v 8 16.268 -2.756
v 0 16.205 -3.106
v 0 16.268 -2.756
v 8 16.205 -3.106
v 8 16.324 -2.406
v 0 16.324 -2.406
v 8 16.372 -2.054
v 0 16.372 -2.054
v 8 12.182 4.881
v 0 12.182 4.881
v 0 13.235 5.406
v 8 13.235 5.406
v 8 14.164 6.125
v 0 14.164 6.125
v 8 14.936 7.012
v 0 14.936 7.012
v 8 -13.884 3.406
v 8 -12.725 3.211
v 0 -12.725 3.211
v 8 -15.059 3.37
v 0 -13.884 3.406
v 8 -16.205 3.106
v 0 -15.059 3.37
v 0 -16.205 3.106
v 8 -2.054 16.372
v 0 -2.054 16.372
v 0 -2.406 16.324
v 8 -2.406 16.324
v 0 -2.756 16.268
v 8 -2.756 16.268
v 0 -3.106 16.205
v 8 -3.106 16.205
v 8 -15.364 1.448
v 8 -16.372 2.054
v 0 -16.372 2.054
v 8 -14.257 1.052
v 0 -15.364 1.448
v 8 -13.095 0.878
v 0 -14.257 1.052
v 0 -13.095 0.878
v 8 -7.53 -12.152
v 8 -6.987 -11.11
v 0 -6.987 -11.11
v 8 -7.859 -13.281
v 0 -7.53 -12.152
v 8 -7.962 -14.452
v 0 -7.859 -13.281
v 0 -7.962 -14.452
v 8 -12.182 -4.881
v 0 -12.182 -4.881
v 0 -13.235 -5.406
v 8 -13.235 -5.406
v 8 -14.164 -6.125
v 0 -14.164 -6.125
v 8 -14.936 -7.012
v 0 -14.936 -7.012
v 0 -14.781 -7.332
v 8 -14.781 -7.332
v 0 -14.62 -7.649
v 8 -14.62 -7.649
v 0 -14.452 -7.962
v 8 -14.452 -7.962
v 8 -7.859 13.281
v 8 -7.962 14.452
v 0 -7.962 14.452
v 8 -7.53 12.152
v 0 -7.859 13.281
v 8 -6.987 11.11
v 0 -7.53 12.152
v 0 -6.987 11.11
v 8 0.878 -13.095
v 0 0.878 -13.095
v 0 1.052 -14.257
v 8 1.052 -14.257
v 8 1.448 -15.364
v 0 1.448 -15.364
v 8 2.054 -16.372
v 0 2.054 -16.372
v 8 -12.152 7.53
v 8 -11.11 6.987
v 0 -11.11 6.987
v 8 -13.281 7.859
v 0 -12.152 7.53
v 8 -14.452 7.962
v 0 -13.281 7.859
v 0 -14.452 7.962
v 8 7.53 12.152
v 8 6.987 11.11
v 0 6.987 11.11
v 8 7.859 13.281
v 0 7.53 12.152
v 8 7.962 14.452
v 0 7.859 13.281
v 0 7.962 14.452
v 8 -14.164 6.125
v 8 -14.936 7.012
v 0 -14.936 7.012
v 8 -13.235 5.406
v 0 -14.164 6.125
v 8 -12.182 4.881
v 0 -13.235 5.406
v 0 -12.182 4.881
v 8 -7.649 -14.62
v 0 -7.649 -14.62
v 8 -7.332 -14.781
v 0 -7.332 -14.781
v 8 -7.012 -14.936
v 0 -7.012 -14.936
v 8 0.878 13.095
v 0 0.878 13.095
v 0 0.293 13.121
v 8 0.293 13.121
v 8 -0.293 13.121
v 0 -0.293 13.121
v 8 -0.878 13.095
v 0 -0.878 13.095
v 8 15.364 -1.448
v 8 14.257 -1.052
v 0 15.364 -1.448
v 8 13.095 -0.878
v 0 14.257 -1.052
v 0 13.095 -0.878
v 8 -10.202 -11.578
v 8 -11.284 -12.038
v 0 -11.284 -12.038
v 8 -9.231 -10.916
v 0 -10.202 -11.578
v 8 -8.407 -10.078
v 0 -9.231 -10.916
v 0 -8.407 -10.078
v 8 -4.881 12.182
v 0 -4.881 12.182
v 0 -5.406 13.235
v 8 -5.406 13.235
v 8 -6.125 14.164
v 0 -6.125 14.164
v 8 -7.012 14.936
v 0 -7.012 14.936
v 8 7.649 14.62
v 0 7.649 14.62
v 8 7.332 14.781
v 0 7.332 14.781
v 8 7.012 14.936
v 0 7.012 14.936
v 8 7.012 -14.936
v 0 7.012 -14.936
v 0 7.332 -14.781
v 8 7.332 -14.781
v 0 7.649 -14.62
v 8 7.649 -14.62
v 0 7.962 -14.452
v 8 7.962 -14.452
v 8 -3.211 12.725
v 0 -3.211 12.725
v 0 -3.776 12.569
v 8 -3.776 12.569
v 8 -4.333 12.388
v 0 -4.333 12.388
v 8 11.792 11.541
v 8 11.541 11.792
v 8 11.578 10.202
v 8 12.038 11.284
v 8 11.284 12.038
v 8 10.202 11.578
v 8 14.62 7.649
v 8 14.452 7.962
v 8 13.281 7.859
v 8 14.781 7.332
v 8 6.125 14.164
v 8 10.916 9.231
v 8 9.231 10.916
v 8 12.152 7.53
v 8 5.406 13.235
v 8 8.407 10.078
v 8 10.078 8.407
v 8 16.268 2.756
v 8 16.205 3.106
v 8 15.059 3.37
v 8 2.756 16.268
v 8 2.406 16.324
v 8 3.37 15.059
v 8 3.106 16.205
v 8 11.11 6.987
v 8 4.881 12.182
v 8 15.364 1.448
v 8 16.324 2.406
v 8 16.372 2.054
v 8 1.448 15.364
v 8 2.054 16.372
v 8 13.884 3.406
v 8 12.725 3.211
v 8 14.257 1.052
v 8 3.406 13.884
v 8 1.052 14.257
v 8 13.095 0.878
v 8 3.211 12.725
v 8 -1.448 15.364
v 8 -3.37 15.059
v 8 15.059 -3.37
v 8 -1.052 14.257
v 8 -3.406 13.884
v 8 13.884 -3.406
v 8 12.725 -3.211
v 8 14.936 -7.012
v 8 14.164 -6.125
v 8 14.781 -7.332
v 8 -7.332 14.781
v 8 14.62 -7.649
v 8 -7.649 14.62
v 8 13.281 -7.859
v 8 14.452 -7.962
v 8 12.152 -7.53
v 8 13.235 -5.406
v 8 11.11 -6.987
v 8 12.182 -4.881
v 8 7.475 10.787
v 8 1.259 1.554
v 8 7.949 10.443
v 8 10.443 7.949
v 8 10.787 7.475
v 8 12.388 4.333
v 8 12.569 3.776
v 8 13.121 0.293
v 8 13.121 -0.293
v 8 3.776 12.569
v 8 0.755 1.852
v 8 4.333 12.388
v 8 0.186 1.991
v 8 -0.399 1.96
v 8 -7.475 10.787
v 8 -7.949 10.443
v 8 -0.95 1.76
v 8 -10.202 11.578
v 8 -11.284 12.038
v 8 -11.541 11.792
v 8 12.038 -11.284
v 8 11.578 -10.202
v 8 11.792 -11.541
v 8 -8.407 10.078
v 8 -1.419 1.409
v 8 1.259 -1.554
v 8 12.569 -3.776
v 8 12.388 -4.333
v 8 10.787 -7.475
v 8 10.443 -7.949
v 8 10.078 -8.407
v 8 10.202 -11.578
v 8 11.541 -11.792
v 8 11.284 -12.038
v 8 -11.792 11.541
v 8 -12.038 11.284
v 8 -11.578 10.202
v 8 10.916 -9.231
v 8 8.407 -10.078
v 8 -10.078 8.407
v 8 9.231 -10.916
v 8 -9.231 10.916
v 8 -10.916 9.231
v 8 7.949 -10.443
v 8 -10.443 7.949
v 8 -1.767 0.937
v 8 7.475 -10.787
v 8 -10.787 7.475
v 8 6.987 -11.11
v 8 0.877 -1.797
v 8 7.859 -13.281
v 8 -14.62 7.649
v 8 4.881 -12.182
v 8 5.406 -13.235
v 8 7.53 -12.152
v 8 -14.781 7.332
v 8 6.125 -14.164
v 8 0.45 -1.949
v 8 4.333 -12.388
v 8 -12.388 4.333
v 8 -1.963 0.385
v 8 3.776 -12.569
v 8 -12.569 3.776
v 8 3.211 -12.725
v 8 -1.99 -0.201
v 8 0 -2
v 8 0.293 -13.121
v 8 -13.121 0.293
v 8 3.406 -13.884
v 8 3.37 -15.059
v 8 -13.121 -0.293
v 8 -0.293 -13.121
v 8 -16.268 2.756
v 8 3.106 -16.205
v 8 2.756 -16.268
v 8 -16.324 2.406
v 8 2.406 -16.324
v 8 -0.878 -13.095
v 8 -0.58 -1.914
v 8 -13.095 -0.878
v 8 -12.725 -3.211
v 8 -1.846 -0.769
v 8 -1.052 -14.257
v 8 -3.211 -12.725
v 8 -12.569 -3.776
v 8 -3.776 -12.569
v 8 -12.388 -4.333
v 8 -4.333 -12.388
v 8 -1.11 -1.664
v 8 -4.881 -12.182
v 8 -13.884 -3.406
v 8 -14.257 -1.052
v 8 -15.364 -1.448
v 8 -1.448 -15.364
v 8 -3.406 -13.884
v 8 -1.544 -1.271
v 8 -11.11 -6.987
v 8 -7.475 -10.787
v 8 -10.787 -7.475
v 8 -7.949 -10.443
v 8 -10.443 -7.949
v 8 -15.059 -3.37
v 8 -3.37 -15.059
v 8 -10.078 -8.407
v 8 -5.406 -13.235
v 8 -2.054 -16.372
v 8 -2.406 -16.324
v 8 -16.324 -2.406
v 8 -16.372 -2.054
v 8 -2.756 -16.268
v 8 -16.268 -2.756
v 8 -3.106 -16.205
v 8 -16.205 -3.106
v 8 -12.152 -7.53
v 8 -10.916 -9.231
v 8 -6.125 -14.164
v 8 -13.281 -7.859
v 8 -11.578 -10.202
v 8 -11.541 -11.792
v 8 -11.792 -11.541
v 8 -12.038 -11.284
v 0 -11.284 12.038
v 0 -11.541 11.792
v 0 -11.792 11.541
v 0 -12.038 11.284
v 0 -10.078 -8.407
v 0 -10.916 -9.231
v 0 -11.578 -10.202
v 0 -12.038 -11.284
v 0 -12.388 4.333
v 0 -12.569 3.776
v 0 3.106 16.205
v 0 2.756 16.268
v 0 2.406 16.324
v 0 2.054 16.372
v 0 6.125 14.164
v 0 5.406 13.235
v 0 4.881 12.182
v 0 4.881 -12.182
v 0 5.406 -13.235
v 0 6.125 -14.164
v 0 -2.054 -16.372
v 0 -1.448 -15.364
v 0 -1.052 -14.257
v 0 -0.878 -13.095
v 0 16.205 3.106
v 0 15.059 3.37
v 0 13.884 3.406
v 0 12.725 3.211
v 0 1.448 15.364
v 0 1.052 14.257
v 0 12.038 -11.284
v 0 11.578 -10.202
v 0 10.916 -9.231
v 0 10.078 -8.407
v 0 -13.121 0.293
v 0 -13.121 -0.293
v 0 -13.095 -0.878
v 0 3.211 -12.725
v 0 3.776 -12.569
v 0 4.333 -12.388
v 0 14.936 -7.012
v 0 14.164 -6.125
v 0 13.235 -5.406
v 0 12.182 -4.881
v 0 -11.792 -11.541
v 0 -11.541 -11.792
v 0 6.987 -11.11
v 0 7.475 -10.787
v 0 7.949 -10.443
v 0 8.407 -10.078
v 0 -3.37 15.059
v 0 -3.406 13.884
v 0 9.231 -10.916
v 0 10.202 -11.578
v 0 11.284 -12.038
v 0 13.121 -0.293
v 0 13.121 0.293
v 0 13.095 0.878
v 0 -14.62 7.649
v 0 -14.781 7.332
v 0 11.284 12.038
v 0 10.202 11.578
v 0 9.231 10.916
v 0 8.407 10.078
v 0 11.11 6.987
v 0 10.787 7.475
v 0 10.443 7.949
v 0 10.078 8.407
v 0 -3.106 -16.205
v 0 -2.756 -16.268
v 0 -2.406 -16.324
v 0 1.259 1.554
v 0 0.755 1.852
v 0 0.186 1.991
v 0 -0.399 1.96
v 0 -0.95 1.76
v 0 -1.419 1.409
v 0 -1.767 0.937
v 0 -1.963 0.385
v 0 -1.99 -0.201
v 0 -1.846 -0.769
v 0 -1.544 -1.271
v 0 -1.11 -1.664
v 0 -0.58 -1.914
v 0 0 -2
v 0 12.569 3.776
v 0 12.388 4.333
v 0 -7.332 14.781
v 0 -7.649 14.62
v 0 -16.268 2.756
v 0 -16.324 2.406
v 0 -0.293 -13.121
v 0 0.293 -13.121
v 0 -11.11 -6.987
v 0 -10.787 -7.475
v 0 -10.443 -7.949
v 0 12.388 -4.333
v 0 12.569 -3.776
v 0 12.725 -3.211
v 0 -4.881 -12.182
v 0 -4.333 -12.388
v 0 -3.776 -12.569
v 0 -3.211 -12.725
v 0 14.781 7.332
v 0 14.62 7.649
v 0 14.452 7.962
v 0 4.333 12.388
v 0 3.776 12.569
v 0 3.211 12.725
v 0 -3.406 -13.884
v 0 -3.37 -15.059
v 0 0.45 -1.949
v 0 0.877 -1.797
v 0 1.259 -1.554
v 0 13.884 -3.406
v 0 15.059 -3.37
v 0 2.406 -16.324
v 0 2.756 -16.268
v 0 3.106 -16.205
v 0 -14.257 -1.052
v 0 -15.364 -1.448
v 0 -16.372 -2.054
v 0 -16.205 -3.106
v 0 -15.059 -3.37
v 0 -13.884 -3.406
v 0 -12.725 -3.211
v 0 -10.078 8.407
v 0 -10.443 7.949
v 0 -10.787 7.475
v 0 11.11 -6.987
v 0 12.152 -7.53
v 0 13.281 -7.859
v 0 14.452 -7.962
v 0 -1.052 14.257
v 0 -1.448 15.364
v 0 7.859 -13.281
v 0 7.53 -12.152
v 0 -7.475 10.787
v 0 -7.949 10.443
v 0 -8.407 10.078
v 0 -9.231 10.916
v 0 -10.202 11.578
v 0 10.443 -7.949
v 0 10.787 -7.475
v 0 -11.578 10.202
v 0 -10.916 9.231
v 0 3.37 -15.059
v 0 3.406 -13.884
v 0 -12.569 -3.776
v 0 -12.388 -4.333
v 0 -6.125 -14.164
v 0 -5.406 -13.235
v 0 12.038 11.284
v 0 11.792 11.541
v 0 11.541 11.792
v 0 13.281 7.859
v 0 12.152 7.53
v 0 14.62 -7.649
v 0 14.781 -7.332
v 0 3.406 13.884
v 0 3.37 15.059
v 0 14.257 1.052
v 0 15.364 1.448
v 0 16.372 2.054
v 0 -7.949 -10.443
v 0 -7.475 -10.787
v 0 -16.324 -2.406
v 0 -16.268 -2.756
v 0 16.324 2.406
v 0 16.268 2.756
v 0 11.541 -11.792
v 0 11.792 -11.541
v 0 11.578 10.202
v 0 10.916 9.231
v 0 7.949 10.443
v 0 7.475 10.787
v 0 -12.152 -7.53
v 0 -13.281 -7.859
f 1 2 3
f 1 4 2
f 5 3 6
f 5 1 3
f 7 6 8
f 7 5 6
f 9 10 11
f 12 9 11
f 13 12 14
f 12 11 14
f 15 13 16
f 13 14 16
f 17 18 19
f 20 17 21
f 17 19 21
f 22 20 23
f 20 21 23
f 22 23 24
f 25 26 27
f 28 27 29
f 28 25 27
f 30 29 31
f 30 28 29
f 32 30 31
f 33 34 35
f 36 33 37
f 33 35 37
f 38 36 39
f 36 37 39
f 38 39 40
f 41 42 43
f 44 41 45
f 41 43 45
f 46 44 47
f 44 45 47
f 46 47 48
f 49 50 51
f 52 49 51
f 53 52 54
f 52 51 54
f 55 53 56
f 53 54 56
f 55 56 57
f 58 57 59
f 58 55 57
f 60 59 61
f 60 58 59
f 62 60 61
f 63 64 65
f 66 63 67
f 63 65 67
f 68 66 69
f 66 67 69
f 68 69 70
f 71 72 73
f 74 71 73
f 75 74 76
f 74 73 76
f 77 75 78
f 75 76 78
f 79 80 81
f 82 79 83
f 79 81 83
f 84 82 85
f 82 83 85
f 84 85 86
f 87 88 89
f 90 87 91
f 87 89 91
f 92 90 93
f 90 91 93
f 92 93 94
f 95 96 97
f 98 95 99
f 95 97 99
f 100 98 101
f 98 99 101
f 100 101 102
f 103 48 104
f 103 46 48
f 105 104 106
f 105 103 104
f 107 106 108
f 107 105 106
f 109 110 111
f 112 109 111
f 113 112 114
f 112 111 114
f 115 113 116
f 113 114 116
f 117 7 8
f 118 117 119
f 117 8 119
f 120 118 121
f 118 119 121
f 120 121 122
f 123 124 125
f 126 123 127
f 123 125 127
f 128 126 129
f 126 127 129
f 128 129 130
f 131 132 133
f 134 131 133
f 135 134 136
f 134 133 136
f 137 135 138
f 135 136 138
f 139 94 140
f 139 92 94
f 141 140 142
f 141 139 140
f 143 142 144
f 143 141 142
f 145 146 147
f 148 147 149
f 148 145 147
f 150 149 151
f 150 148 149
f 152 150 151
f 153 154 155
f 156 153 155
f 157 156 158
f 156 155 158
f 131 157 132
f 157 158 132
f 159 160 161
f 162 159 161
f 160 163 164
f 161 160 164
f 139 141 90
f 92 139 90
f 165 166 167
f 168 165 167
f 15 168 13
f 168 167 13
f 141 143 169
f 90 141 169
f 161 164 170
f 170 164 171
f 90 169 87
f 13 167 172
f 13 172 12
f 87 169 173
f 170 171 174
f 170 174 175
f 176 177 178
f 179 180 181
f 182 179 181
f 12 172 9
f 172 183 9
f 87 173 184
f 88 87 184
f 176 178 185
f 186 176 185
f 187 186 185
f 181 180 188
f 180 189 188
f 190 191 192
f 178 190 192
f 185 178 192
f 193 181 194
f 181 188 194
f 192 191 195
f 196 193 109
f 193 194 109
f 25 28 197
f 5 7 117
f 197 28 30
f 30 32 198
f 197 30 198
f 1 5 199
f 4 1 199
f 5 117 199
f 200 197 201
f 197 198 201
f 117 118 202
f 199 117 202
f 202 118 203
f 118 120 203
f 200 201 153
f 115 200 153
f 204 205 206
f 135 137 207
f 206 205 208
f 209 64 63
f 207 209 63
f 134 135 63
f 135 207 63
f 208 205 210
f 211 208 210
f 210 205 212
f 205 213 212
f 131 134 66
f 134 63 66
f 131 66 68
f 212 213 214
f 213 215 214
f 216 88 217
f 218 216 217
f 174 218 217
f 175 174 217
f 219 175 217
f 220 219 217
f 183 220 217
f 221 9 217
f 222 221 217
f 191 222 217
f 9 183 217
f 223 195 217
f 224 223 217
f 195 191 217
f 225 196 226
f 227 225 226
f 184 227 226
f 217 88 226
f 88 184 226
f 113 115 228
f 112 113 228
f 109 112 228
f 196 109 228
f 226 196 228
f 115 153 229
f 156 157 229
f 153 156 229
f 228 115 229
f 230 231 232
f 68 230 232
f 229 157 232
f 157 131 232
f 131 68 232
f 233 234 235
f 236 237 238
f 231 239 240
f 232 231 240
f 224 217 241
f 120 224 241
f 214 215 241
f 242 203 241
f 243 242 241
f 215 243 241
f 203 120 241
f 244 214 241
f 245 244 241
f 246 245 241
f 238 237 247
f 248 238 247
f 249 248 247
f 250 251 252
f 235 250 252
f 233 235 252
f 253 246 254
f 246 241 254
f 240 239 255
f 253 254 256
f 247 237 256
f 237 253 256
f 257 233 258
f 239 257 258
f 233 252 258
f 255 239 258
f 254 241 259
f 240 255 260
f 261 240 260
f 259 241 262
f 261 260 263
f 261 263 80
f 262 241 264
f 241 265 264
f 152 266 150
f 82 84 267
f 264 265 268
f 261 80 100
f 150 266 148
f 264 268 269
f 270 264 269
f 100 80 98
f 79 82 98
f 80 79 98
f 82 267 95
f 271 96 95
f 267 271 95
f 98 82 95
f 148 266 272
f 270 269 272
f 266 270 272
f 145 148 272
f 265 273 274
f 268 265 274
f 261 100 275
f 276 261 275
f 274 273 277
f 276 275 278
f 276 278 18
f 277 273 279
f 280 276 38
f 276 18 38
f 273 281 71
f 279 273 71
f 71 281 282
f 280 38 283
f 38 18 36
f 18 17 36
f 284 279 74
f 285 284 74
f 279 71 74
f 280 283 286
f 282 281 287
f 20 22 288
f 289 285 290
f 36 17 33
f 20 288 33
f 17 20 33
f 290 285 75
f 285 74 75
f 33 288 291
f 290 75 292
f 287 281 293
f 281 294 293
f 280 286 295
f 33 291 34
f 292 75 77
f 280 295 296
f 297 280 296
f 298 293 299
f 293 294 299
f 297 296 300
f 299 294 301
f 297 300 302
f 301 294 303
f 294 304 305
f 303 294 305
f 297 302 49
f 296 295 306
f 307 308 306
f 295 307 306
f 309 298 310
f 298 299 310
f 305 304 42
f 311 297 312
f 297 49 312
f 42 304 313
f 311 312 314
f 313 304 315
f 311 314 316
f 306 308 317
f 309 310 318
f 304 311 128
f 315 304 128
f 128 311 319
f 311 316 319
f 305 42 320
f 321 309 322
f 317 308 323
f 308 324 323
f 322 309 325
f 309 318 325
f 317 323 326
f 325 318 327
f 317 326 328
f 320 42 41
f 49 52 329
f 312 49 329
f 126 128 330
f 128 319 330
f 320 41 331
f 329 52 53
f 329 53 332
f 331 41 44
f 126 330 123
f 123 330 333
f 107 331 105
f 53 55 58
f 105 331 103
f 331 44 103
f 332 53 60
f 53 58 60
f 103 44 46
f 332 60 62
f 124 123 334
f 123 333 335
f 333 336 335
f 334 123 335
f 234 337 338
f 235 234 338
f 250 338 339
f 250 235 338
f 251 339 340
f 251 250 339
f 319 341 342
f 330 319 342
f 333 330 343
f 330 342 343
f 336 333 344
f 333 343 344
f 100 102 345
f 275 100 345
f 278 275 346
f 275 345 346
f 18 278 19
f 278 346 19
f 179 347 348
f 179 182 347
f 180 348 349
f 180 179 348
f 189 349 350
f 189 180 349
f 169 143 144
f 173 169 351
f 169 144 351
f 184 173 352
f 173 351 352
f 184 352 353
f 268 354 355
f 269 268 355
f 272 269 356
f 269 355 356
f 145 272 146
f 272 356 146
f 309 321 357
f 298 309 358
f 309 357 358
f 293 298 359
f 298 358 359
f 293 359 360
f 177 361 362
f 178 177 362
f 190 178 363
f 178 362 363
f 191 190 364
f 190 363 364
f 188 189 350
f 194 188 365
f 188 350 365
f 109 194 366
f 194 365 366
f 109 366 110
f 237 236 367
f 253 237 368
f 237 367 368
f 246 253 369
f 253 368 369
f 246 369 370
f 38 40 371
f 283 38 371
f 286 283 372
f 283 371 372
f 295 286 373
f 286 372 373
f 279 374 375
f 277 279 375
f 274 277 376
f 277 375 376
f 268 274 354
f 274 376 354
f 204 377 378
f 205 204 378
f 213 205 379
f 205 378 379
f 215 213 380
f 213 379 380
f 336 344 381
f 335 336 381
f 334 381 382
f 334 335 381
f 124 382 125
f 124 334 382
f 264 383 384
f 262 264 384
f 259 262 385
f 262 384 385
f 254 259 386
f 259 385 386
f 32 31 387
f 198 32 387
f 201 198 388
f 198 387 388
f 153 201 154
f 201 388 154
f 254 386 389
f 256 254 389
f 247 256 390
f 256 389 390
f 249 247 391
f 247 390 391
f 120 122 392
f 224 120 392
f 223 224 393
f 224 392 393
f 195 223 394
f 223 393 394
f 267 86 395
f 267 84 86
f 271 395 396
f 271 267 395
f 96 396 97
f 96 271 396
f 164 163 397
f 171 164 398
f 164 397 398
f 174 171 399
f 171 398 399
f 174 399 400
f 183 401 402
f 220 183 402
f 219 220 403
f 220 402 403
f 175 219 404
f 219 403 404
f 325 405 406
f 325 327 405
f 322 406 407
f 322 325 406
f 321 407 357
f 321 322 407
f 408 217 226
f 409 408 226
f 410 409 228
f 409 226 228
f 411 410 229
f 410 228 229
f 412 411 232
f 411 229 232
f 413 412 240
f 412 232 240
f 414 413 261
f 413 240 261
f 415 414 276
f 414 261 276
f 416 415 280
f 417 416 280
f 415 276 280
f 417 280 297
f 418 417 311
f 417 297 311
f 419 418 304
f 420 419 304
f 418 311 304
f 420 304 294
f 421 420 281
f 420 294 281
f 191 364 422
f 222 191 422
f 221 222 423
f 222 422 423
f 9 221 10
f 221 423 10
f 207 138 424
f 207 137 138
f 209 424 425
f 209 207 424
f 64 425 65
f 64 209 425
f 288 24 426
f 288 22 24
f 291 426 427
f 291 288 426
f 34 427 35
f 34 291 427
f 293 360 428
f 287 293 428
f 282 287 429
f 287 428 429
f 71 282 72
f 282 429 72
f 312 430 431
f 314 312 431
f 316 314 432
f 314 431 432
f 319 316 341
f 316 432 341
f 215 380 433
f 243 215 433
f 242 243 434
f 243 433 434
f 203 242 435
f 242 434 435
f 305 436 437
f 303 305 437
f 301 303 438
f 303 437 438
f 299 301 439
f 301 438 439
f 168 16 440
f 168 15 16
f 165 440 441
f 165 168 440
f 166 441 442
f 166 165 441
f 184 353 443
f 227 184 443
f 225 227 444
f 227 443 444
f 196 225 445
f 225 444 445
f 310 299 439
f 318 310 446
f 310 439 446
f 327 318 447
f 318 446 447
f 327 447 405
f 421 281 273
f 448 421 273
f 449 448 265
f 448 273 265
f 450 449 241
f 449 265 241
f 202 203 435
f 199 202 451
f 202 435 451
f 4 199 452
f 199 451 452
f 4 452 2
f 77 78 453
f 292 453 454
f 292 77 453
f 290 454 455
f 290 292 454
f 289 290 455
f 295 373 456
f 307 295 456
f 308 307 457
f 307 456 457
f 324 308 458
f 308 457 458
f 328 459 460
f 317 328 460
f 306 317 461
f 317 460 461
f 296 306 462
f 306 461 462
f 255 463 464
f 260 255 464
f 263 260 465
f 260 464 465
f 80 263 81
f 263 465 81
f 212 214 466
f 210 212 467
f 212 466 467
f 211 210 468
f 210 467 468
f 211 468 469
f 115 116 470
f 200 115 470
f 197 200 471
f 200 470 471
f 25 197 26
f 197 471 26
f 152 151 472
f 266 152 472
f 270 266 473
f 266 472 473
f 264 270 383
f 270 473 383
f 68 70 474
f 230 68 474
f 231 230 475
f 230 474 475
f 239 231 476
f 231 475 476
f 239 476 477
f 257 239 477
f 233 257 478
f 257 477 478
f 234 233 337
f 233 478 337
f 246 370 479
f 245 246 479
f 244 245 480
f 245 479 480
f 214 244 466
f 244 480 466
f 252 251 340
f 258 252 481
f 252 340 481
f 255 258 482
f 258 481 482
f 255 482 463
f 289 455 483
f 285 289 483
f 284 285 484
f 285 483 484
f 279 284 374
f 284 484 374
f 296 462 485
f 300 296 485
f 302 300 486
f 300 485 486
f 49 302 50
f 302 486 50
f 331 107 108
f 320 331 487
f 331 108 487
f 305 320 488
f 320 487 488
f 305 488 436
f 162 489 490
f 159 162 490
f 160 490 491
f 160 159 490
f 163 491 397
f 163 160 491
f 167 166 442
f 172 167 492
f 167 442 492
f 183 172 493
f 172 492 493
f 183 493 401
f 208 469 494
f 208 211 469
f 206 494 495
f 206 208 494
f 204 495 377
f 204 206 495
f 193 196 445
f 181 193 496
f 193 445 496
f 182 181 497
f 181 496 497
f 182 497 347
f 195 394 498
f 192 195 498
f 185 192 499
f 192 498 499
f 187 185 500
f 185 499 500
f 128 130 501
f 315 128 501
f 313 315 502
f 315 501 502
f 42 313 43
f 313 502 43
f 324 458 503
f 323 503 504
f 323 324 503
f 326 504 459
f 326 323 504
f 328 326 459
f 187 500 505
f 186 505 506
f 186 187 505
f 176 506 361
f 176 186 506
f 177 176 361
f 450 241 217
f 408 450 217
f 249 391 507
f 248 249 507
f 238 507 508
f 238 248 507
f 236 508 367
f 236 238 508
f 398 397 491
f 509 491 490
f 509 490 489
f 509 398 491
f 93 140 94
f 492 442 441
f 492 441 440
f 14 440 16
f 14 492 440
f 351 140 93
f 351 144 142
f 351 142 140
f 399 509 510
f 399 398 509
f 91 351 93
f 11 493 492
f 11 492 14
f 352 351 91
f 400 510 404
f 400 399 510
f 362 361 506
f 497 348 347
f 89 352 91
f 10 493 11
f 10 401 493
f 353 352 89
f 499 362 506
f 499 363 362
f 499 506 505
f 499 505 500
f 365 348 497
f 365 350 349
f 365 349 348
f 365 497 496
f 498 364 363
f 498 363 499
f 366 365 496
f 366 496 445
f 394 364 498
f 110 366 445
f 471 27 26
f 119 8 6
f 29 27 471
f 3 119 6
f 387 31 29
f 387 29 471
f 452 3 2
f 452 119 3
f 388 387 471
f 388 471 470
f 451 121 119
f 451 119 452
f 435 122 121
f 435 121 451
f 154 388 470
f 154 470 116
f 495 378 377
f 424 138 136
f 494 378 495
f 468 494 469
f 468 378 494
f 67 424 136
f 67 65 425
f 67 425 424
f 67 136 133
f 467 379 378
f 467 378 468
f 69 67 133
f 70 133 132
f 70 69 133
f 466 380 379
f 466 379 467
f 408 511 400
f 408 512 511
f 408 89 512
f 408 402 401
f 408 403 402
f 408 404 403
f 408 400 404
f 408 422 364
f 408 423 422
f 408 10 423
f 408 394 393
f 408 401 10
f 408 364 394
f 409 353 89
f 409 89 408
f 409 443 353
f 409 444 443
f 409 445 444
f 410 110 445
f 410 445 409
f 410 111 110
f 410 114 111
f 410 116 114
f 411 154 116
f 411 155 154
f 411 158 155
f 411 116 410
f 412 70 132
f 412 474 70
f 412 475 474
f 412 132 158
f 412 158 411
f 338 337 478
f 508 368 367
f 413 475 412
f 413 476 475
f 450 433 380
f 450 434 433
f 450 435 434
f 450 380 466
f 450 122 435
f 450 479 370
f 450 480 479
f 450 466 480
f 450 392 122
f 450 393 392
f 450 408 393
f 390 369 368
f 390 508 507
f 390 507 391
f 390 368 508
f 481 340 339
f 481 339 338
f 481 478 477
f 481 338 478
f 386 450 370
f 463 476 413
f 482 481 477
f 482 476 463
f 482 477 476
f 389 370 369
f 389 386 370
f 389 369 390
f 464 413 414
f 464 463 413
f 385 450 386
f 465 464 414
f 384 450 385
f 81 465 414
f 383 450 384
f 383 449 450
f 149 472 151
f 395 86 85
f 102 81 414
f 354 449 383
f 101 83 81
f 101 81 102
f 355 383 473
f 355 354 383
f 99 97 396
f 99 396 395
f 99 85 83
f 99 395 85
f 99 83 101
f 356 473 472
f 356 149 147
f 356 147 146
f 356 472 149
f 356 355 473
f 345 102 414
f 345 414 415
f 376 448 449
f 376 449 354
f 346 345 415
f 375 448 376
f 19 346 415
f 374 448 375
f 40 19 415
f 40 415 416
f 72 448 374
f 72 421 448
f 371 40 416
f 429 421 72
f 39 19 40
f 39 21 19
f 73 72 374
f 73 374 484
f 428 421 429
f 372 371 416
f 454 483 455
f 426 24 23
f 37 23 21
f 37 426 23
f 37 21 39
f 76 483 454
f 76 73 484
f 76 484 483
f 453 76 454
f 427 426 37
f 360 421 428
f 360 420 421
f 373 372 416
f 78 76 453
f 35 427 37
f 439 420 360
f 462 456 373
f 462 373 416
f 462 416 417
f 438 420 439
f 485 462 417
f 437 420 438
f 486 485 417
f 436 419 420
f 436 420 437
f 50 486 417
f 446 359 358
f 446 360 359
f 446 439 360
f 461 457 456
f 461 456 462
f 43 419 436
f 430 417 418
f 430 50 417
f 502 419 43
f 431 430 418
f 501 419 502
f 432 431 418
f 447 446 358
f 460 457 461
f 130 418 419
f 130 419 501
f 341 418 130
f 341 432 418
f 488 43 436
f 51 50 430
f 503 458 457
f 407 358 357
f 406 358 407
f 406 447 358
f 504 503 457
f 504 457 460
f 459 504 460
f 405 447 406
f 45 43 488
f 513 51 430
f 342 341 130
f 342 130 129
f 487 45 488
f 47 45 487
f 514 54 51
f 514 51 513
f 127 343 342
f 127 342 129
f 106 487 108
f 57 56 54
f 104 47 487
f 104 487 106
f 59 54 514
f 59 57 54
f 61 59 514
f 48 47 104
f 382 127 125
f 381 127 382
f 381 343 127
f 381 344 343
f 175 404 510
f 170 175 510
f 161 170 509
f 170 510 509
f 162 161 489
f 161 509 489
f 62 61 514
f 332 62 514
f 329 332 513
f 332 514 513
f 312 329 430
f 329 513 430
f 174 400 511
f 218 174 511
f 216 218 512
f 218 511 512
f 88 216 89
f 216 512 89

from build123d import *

# Parameters (mm, degrees)
BASPROSKE_W        = 8
BASPROSKE_H        = 16.5
TOOTHCUT_DEPTH     = 25.667792767
TEETHCUTS_COUNT    = 20
TEETHCUTS_ANGLE    = 342
BORSKE_R           = 0.4
BORE_DEPTH         = 50.0000508
CUT_EXTRUDE1_DEPTH = 25.496234031


with BuildPart() as part:
    # BasProSke → Base-Revolve (revolve)
    with BuildSketch(Plane(origin=(0, 0, 0), x_dir=(1, 0, 0), z_dir=(0, 1, 0)), mode=Mode.PRIVATE) as base_revolve_sk:
        with Locations((4, 8.25)):
            Rectangle(BASPROSKE_W, BASPROSKE_H)
    revolve(base_revolve_sk.sketch.rotate(Axis((-10, 0, 0), (1, 0, 0)), 180), axis=Axis((-10, 0, 0), (1, 0, 0)))

    # TooCutSke → ToothCut (cut, through all)
    with BuildSketch(Plane(origin=(0, 0, 0), x_dir=(0, 0, -1), z_dir=(1, 0, 0))):
        with BuildLine():
            ThreePointArc((0.877929023, 13.094602576), (0, 13.124), (-0.877929023, 13.094602576))
            ThreePointArc((-0.877929023, 13.094602576), (-1.227785764, 14.834041313), (-2.071065599, 16.395106966))
            ThreePointArc((-2.071065599, 16.395106966), (0, 16.5254), (2.071065599, 16.395106966))
            ThreePointArc((2.071065599, 16.395106966), (1.227785764, 14.834041313), (0.877929023, 13.094602576))
        make_face()
    toothcut = extrude(amount=TOOTHCUT_DEPTH, mode=Mode.SUBTRACT)

    # TeethCuts: ToothCut ×20 about axis
    teethcuts_axis = Axis((-10, 0, 0), (1, 0, 0))
    for i in range(1, TEETHCUTS_COUNT):
        add(toothcut.rotate(teethcuts_axis, i * TEETHCUTS_ANGLE / (TEETHCUTS_COUNT - 1)), mode=Mode.SUBTRACT)

    # BorSke → Bore (cut, symmetric)
    with BuildSketch(Plane(origin=(0, 0, 0), x_dir=(0, 0, -1), z_dir=(1, 0, 0))):
        with Locations(Location((0, 0, 0), (0, 0, 180))):
            Circle(BORSKE_R)
    extrude(amount=BORE_DEPTH, both=True, mode=Mode.SUBTRACT)

    # Sketch1 → Cut-Extrude1 (cut, through all)
    with BuildSketch(Plane(origin=(8, 0, 0), x_dir=(0, 0, -1), z_dir=(1, 0, 0))):
        with BuildLine():
            ThreePointArc((2, 0), (1.8851176, 0.668080559), (1.553668367, 1.25941042))
            Line((1.553668367, 1.25941042), (-1.553668367, 1.25941042))
            ThreePointArc((-1.553668367, 1.25941042), (-0.668080559, -1.8851176), (2, 0))
        make_face()
    extrude(amount=-CUT_EXTRUDE1_DEPTH, mode=Mode.SUBTRACT)


solid = part.part
